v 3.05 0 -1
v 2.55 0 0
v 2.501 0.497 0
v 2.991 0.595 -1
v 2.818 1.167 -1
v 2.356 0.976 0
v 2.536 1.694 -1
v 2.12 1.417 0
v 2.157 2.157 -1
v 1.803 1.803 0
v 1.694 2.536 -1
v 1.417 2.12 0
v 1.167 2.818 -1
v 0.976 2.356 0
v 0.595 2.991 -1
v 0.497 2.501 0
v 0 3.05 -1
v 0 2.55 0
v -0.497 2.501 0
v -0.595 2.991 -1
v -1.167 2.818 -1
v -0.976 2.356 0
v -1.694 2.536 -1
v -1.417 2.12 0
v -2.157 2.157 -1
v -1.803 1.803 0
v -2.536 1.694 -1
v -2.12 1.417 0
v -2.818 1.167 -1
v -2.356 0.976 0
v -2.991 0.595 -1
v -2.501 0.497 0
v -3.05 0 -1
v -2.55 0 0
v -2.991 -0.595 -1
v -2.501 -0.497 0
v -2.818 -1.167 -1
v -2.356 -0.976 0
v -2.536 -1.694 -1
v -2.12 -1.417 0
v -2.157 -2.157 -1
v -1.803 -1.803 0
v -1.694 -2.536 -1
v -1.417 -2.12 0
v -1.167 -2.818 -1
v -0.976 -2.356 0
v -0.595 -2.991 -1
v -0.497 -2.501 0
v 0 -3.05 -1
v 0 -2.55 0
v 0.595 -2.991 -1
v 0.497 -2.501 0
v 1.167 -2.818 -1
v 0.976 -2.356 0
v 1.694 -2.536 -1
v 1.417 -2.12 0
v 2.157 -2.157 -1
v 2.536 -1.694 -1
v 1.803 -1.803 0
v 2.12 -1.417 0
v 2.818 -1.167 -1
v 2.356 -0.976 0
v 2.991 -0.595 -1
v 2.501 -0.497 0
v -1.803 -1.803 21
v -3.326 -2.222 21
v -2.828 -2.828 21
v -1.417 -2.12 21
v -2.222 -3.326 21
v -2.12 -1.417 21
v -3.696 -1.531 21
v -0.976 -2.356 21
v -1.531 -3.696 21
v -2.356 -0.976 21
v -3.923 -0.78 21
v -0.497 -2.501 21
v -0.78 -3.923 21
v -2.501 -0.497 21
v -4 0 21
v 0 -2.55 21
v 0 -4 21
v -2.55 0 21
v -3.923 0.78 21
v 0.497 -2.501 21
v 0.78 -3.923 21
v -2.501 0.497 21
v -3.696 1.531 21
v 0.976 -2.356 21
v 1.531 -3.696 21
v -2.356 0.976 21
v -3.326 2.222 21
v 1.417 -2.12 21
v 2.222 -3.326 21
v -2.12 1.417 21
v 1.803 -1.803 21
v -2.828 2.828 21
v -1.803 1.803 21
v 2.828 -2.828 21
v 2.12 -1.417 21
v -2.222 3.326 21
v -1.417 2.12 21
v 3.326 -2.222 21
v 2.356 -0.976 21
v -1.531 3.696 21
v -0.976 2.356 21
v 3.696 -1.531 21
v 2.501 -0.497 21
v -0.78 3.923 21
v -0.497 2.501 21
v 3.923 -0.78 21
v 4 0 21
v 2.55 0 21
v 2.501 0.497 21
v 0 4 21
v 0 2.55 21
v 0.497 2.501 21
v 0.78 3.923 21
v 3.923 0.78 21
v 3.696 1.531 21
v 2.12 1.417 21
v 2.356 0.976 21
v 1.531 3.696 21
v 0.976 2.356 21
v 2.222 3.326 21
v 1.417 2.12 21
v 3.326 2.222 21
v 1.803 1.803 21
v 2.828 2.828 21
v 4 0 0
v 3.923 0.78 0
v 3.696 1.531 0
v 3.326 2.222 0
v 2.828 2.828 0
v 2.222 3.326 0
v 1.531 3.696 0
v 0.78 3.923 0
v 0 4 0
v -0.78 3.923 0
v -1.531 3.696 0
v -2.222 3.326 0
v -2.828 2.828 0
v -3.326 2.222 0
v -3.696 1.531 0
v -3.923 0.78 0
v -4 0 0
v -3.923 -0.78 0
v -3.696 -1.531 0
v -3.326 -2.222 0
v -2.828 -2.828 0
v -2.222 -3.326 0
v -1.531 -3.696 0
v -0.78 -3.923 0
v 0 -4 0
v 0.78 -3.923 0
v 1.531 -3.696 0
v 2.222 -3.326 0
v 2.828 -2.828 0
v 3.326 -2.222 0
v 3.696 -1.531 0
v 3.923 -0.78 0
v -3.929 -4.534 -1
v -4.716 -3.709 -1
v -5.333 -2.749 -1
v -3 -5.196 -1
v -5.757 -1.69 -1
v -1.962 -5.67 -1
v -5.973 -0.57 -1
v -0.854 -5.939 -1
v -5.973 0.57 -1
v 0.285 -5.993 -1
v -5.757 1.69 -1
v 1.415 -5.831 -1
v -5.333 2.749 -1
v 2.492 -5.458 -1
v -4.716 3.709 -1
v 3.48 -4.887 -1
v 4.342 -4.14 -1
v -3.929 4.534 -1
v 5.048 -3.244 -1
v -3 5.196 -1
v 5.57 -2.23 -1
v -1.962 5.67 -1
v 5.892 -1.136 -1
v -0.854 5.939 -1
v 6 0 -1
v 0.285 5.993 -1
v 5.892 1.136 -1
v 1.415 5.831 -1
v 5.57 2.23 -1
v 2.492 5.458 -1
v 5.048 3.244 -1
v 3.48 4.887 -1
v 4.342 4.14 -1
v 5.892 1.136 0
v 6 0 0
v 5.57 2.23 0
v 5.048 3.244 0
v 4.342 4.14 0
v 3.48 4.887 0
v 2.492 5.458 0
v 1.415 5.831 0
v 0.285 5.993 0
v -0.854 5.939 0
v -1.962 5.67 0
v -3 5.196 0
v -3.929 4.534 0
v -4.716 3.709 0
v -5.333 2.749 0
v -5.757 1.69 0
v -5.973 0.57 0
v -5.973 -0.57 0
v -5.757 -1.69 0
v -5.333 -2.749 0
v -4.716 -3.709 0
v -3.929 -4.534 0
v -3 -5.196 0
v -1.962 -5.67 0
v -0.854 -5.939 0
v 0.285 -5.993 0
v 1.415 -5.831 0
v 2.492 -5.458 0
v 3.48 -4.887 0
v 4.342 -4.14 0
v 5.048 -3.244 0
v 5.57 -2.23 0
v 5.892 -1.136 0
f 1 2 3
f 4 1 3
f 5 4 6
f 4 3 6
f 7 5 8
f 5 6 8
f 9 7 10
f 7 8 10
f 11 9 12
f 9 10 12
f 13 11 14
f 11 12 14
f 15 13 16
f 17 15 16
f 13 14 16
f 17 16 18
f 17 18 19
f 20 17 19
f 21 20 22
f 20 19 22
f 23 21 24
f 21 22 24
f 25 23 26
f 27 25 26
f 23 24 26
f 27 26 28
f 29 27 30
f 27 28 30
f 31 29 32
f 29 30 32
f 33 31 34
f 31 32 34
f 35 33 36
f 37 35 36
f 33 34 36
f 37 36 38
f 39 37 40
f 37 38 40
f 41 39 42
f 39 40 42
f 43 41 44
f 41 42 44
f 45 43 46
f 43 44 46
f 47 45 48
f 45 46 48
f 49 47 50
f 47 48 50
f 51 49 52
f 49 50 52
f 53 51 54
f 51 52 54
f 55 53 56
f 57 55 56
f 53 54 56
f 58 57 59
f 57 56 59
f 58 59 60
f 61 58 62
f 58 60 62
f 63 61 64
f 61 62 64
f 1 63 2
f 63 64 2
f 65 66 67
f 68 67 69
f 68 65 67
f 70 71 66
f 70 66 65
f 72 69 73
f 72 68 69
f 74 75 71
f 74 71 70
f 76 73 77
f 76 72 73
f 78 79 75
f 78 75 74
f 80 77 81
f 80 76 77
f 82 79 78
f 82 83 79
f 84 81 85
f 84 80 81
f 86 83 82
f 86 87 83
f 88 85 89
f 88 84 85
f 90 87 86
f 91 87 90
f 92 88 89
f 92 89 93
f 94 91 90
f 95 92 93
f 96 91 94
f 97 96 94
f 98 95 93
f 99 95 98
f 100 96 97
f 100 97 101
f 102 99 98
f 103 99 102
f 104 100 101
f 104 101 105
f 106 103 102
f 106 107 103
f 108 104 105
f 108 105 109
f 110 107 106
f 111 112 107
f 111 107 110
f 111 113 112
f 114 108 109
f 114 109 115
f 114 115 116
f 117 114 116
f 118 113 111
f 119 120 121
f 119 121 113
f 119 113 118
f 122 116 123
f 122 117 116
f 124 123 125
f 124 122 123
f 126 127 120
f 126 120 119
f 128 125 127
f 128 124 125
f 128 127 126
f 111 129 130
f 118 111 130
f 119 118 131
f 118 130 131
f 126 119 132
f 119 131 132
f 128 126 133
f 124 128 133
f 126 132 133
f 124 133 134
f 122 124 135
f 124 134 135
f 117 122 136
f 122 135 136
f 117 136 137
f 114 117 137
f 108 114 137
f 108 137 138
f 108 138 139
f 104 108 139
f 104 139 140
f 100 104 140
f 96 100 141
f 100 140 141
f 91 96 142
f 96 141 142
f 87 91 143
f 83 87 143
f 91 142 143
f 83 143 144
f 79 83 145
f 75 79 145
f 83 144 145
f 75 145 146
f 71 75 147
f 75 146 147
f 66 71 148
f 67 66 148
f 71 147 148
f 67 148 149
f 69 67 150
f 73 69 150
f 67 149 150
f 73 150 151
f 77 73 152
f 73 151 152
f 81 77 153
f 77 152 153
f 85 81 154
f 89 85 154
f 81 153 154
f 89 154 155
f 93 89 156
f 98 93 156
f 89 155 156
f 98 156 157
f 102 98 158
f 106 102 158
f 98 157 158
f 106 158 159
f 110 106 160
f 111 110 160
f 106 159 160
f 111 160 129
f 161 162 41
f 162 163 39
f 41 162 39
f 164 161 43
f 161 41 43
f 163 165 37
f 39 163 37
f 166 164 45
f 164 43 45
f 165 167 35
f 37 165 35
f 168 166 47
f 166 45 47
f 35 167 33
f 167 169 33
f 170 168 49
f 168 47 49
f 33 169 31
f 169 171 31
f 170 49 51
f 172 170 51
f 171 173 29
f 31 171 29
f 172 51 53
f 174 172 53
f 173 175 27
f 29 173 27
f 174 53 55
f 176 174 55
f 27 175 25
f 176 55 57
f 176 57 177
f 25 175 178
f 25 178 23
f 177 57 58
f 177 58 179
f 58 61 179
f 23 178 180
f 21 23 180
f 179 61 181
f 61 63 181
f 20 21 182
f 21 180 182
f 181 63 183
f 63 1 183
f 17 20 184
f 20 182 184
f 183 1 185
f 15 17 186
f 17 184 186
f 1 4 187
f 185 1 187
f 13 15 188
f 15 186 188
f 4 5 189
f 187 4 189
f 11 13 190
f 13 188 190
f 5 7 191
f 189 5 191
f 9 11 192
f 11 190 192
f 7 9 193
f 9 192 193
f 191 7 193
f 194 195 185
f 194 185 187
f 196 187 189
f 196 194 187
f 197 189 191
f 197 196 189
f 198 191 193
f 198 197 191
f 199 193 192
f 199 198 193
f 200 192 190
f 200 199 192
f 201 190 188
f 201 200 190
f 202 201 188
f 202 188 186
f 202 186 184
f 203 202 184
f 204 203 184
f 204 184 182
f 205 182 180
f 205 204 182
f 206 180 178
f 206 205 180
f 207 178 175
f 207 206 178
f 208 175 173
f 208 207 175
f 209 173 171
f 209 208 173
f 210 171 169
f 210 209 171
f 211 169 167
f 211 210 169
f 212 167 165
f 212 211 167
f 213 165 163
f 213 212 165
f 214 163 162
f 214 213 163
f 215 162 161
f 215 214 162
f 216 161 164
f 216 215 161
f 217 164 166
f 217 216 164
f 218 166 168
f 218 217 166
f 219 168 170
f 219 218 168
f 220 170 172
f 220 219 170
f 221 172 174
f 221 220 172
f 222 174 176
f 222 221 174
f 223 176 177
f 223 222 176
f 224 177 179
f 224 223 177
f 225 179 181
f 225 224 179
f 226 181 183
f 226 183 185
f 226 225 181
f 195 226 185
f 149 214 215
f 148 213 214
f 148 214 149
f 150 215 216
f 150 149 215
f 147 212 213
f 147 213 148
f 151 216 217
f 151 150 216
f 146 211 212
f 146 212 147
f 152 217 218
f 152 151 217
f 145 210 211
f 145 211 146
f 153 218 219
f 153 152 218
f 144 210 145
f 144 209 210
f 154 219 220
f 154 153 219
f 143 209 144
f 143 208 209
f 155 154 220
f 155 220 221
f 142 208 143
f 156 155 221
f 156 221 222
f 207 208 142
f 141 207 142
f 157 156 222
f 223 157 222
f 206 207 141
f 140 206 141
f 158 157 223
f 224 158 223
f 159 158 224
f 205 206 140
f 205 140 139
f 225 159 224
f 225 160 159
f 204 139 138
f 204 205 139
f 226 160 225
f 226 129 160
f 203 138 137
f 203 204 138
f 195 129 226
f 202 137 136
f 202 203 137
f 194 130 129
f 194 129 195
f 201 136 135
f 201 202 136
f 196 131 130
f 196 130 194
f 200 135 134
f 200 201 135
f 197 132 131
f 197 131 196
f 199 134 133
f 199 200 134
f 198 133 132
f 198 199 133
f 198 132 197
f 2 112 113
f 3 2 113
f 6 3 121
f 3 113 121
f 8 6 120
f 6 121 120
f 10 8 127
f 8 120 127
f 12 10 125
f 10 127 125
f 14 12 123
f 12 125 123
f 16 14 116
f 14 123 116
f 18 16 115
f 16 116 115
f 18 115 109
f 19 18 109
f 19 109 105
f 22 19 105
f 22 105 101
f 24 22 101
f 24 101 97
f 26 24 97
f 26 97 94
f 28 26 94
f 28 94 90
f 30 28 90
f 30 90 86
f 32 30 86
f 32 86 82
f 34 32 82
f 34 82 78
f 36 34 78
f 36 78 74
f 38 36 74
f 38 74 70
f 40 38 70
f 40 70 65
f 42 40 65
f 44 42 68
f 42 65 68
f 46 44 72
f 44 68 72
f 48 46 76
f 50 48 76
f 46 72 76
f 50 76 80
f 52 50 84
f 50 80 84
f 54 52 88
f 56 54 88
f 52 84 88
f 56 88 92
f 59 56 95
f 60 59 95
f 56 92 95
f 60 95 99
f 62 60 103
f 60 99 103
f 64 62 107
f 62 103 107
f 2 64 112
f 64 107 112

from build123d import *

# Parameters (mm, degrees)
SKETCH026_R          = 6
PAD012_DEPTH         = 1
SKETCH027_R          = 4
PAD013_DEPTH         = 21
SKETCH028_R          = 2.55
POCKET010_DEPTH      = 1.001
POCKET010_DEPTH_BACK = 21.001
CHAMFER_SIZE2        = 1
CHAMFER_SIZE         = 0.5


with BuildPart() as part:
    # Sketch026 → Pad012 (new body)
    with BuildSketch(Plane.XY):
        Circle(SKETCH026_R)
    extrude(amount=-PAD012_DEPTH)

    # Sketch027 → Pad013 (join)
    with BuildSketch(Plane.XY):
        Circle(SKETCH027_R)
    extrude(amount=PAD013_DEPTH)

    # Sketch028 → Pocket010 (cut, two sides)
    with BuildSketch(Plane.XY) as pocket010_sk:
        Circle(SKETCH028_R)
    extrude(amount=-POCKET010_DEPTH, mode=Mode.SUBTRACT)
    extrude(pocket010_sk.sketch, amount=POCKET010_DEPTH_BACK, mode=Mode.SUBTRACT)

    # Chamfer
    chamfer_edges = [part.edges().sort_by_distance(p)[0] for p in [
        (-2.55, 0, -1),
    ]]
    chamfer_side = part.faces().sort_by_distance((-5.830294, 0, -1))[0]
    chamfer(chamfer_edges, length=CHAMFER_SIZE, length2=CHAMFER_SIZE2, reference=chamfer_side)


solid = part.part
